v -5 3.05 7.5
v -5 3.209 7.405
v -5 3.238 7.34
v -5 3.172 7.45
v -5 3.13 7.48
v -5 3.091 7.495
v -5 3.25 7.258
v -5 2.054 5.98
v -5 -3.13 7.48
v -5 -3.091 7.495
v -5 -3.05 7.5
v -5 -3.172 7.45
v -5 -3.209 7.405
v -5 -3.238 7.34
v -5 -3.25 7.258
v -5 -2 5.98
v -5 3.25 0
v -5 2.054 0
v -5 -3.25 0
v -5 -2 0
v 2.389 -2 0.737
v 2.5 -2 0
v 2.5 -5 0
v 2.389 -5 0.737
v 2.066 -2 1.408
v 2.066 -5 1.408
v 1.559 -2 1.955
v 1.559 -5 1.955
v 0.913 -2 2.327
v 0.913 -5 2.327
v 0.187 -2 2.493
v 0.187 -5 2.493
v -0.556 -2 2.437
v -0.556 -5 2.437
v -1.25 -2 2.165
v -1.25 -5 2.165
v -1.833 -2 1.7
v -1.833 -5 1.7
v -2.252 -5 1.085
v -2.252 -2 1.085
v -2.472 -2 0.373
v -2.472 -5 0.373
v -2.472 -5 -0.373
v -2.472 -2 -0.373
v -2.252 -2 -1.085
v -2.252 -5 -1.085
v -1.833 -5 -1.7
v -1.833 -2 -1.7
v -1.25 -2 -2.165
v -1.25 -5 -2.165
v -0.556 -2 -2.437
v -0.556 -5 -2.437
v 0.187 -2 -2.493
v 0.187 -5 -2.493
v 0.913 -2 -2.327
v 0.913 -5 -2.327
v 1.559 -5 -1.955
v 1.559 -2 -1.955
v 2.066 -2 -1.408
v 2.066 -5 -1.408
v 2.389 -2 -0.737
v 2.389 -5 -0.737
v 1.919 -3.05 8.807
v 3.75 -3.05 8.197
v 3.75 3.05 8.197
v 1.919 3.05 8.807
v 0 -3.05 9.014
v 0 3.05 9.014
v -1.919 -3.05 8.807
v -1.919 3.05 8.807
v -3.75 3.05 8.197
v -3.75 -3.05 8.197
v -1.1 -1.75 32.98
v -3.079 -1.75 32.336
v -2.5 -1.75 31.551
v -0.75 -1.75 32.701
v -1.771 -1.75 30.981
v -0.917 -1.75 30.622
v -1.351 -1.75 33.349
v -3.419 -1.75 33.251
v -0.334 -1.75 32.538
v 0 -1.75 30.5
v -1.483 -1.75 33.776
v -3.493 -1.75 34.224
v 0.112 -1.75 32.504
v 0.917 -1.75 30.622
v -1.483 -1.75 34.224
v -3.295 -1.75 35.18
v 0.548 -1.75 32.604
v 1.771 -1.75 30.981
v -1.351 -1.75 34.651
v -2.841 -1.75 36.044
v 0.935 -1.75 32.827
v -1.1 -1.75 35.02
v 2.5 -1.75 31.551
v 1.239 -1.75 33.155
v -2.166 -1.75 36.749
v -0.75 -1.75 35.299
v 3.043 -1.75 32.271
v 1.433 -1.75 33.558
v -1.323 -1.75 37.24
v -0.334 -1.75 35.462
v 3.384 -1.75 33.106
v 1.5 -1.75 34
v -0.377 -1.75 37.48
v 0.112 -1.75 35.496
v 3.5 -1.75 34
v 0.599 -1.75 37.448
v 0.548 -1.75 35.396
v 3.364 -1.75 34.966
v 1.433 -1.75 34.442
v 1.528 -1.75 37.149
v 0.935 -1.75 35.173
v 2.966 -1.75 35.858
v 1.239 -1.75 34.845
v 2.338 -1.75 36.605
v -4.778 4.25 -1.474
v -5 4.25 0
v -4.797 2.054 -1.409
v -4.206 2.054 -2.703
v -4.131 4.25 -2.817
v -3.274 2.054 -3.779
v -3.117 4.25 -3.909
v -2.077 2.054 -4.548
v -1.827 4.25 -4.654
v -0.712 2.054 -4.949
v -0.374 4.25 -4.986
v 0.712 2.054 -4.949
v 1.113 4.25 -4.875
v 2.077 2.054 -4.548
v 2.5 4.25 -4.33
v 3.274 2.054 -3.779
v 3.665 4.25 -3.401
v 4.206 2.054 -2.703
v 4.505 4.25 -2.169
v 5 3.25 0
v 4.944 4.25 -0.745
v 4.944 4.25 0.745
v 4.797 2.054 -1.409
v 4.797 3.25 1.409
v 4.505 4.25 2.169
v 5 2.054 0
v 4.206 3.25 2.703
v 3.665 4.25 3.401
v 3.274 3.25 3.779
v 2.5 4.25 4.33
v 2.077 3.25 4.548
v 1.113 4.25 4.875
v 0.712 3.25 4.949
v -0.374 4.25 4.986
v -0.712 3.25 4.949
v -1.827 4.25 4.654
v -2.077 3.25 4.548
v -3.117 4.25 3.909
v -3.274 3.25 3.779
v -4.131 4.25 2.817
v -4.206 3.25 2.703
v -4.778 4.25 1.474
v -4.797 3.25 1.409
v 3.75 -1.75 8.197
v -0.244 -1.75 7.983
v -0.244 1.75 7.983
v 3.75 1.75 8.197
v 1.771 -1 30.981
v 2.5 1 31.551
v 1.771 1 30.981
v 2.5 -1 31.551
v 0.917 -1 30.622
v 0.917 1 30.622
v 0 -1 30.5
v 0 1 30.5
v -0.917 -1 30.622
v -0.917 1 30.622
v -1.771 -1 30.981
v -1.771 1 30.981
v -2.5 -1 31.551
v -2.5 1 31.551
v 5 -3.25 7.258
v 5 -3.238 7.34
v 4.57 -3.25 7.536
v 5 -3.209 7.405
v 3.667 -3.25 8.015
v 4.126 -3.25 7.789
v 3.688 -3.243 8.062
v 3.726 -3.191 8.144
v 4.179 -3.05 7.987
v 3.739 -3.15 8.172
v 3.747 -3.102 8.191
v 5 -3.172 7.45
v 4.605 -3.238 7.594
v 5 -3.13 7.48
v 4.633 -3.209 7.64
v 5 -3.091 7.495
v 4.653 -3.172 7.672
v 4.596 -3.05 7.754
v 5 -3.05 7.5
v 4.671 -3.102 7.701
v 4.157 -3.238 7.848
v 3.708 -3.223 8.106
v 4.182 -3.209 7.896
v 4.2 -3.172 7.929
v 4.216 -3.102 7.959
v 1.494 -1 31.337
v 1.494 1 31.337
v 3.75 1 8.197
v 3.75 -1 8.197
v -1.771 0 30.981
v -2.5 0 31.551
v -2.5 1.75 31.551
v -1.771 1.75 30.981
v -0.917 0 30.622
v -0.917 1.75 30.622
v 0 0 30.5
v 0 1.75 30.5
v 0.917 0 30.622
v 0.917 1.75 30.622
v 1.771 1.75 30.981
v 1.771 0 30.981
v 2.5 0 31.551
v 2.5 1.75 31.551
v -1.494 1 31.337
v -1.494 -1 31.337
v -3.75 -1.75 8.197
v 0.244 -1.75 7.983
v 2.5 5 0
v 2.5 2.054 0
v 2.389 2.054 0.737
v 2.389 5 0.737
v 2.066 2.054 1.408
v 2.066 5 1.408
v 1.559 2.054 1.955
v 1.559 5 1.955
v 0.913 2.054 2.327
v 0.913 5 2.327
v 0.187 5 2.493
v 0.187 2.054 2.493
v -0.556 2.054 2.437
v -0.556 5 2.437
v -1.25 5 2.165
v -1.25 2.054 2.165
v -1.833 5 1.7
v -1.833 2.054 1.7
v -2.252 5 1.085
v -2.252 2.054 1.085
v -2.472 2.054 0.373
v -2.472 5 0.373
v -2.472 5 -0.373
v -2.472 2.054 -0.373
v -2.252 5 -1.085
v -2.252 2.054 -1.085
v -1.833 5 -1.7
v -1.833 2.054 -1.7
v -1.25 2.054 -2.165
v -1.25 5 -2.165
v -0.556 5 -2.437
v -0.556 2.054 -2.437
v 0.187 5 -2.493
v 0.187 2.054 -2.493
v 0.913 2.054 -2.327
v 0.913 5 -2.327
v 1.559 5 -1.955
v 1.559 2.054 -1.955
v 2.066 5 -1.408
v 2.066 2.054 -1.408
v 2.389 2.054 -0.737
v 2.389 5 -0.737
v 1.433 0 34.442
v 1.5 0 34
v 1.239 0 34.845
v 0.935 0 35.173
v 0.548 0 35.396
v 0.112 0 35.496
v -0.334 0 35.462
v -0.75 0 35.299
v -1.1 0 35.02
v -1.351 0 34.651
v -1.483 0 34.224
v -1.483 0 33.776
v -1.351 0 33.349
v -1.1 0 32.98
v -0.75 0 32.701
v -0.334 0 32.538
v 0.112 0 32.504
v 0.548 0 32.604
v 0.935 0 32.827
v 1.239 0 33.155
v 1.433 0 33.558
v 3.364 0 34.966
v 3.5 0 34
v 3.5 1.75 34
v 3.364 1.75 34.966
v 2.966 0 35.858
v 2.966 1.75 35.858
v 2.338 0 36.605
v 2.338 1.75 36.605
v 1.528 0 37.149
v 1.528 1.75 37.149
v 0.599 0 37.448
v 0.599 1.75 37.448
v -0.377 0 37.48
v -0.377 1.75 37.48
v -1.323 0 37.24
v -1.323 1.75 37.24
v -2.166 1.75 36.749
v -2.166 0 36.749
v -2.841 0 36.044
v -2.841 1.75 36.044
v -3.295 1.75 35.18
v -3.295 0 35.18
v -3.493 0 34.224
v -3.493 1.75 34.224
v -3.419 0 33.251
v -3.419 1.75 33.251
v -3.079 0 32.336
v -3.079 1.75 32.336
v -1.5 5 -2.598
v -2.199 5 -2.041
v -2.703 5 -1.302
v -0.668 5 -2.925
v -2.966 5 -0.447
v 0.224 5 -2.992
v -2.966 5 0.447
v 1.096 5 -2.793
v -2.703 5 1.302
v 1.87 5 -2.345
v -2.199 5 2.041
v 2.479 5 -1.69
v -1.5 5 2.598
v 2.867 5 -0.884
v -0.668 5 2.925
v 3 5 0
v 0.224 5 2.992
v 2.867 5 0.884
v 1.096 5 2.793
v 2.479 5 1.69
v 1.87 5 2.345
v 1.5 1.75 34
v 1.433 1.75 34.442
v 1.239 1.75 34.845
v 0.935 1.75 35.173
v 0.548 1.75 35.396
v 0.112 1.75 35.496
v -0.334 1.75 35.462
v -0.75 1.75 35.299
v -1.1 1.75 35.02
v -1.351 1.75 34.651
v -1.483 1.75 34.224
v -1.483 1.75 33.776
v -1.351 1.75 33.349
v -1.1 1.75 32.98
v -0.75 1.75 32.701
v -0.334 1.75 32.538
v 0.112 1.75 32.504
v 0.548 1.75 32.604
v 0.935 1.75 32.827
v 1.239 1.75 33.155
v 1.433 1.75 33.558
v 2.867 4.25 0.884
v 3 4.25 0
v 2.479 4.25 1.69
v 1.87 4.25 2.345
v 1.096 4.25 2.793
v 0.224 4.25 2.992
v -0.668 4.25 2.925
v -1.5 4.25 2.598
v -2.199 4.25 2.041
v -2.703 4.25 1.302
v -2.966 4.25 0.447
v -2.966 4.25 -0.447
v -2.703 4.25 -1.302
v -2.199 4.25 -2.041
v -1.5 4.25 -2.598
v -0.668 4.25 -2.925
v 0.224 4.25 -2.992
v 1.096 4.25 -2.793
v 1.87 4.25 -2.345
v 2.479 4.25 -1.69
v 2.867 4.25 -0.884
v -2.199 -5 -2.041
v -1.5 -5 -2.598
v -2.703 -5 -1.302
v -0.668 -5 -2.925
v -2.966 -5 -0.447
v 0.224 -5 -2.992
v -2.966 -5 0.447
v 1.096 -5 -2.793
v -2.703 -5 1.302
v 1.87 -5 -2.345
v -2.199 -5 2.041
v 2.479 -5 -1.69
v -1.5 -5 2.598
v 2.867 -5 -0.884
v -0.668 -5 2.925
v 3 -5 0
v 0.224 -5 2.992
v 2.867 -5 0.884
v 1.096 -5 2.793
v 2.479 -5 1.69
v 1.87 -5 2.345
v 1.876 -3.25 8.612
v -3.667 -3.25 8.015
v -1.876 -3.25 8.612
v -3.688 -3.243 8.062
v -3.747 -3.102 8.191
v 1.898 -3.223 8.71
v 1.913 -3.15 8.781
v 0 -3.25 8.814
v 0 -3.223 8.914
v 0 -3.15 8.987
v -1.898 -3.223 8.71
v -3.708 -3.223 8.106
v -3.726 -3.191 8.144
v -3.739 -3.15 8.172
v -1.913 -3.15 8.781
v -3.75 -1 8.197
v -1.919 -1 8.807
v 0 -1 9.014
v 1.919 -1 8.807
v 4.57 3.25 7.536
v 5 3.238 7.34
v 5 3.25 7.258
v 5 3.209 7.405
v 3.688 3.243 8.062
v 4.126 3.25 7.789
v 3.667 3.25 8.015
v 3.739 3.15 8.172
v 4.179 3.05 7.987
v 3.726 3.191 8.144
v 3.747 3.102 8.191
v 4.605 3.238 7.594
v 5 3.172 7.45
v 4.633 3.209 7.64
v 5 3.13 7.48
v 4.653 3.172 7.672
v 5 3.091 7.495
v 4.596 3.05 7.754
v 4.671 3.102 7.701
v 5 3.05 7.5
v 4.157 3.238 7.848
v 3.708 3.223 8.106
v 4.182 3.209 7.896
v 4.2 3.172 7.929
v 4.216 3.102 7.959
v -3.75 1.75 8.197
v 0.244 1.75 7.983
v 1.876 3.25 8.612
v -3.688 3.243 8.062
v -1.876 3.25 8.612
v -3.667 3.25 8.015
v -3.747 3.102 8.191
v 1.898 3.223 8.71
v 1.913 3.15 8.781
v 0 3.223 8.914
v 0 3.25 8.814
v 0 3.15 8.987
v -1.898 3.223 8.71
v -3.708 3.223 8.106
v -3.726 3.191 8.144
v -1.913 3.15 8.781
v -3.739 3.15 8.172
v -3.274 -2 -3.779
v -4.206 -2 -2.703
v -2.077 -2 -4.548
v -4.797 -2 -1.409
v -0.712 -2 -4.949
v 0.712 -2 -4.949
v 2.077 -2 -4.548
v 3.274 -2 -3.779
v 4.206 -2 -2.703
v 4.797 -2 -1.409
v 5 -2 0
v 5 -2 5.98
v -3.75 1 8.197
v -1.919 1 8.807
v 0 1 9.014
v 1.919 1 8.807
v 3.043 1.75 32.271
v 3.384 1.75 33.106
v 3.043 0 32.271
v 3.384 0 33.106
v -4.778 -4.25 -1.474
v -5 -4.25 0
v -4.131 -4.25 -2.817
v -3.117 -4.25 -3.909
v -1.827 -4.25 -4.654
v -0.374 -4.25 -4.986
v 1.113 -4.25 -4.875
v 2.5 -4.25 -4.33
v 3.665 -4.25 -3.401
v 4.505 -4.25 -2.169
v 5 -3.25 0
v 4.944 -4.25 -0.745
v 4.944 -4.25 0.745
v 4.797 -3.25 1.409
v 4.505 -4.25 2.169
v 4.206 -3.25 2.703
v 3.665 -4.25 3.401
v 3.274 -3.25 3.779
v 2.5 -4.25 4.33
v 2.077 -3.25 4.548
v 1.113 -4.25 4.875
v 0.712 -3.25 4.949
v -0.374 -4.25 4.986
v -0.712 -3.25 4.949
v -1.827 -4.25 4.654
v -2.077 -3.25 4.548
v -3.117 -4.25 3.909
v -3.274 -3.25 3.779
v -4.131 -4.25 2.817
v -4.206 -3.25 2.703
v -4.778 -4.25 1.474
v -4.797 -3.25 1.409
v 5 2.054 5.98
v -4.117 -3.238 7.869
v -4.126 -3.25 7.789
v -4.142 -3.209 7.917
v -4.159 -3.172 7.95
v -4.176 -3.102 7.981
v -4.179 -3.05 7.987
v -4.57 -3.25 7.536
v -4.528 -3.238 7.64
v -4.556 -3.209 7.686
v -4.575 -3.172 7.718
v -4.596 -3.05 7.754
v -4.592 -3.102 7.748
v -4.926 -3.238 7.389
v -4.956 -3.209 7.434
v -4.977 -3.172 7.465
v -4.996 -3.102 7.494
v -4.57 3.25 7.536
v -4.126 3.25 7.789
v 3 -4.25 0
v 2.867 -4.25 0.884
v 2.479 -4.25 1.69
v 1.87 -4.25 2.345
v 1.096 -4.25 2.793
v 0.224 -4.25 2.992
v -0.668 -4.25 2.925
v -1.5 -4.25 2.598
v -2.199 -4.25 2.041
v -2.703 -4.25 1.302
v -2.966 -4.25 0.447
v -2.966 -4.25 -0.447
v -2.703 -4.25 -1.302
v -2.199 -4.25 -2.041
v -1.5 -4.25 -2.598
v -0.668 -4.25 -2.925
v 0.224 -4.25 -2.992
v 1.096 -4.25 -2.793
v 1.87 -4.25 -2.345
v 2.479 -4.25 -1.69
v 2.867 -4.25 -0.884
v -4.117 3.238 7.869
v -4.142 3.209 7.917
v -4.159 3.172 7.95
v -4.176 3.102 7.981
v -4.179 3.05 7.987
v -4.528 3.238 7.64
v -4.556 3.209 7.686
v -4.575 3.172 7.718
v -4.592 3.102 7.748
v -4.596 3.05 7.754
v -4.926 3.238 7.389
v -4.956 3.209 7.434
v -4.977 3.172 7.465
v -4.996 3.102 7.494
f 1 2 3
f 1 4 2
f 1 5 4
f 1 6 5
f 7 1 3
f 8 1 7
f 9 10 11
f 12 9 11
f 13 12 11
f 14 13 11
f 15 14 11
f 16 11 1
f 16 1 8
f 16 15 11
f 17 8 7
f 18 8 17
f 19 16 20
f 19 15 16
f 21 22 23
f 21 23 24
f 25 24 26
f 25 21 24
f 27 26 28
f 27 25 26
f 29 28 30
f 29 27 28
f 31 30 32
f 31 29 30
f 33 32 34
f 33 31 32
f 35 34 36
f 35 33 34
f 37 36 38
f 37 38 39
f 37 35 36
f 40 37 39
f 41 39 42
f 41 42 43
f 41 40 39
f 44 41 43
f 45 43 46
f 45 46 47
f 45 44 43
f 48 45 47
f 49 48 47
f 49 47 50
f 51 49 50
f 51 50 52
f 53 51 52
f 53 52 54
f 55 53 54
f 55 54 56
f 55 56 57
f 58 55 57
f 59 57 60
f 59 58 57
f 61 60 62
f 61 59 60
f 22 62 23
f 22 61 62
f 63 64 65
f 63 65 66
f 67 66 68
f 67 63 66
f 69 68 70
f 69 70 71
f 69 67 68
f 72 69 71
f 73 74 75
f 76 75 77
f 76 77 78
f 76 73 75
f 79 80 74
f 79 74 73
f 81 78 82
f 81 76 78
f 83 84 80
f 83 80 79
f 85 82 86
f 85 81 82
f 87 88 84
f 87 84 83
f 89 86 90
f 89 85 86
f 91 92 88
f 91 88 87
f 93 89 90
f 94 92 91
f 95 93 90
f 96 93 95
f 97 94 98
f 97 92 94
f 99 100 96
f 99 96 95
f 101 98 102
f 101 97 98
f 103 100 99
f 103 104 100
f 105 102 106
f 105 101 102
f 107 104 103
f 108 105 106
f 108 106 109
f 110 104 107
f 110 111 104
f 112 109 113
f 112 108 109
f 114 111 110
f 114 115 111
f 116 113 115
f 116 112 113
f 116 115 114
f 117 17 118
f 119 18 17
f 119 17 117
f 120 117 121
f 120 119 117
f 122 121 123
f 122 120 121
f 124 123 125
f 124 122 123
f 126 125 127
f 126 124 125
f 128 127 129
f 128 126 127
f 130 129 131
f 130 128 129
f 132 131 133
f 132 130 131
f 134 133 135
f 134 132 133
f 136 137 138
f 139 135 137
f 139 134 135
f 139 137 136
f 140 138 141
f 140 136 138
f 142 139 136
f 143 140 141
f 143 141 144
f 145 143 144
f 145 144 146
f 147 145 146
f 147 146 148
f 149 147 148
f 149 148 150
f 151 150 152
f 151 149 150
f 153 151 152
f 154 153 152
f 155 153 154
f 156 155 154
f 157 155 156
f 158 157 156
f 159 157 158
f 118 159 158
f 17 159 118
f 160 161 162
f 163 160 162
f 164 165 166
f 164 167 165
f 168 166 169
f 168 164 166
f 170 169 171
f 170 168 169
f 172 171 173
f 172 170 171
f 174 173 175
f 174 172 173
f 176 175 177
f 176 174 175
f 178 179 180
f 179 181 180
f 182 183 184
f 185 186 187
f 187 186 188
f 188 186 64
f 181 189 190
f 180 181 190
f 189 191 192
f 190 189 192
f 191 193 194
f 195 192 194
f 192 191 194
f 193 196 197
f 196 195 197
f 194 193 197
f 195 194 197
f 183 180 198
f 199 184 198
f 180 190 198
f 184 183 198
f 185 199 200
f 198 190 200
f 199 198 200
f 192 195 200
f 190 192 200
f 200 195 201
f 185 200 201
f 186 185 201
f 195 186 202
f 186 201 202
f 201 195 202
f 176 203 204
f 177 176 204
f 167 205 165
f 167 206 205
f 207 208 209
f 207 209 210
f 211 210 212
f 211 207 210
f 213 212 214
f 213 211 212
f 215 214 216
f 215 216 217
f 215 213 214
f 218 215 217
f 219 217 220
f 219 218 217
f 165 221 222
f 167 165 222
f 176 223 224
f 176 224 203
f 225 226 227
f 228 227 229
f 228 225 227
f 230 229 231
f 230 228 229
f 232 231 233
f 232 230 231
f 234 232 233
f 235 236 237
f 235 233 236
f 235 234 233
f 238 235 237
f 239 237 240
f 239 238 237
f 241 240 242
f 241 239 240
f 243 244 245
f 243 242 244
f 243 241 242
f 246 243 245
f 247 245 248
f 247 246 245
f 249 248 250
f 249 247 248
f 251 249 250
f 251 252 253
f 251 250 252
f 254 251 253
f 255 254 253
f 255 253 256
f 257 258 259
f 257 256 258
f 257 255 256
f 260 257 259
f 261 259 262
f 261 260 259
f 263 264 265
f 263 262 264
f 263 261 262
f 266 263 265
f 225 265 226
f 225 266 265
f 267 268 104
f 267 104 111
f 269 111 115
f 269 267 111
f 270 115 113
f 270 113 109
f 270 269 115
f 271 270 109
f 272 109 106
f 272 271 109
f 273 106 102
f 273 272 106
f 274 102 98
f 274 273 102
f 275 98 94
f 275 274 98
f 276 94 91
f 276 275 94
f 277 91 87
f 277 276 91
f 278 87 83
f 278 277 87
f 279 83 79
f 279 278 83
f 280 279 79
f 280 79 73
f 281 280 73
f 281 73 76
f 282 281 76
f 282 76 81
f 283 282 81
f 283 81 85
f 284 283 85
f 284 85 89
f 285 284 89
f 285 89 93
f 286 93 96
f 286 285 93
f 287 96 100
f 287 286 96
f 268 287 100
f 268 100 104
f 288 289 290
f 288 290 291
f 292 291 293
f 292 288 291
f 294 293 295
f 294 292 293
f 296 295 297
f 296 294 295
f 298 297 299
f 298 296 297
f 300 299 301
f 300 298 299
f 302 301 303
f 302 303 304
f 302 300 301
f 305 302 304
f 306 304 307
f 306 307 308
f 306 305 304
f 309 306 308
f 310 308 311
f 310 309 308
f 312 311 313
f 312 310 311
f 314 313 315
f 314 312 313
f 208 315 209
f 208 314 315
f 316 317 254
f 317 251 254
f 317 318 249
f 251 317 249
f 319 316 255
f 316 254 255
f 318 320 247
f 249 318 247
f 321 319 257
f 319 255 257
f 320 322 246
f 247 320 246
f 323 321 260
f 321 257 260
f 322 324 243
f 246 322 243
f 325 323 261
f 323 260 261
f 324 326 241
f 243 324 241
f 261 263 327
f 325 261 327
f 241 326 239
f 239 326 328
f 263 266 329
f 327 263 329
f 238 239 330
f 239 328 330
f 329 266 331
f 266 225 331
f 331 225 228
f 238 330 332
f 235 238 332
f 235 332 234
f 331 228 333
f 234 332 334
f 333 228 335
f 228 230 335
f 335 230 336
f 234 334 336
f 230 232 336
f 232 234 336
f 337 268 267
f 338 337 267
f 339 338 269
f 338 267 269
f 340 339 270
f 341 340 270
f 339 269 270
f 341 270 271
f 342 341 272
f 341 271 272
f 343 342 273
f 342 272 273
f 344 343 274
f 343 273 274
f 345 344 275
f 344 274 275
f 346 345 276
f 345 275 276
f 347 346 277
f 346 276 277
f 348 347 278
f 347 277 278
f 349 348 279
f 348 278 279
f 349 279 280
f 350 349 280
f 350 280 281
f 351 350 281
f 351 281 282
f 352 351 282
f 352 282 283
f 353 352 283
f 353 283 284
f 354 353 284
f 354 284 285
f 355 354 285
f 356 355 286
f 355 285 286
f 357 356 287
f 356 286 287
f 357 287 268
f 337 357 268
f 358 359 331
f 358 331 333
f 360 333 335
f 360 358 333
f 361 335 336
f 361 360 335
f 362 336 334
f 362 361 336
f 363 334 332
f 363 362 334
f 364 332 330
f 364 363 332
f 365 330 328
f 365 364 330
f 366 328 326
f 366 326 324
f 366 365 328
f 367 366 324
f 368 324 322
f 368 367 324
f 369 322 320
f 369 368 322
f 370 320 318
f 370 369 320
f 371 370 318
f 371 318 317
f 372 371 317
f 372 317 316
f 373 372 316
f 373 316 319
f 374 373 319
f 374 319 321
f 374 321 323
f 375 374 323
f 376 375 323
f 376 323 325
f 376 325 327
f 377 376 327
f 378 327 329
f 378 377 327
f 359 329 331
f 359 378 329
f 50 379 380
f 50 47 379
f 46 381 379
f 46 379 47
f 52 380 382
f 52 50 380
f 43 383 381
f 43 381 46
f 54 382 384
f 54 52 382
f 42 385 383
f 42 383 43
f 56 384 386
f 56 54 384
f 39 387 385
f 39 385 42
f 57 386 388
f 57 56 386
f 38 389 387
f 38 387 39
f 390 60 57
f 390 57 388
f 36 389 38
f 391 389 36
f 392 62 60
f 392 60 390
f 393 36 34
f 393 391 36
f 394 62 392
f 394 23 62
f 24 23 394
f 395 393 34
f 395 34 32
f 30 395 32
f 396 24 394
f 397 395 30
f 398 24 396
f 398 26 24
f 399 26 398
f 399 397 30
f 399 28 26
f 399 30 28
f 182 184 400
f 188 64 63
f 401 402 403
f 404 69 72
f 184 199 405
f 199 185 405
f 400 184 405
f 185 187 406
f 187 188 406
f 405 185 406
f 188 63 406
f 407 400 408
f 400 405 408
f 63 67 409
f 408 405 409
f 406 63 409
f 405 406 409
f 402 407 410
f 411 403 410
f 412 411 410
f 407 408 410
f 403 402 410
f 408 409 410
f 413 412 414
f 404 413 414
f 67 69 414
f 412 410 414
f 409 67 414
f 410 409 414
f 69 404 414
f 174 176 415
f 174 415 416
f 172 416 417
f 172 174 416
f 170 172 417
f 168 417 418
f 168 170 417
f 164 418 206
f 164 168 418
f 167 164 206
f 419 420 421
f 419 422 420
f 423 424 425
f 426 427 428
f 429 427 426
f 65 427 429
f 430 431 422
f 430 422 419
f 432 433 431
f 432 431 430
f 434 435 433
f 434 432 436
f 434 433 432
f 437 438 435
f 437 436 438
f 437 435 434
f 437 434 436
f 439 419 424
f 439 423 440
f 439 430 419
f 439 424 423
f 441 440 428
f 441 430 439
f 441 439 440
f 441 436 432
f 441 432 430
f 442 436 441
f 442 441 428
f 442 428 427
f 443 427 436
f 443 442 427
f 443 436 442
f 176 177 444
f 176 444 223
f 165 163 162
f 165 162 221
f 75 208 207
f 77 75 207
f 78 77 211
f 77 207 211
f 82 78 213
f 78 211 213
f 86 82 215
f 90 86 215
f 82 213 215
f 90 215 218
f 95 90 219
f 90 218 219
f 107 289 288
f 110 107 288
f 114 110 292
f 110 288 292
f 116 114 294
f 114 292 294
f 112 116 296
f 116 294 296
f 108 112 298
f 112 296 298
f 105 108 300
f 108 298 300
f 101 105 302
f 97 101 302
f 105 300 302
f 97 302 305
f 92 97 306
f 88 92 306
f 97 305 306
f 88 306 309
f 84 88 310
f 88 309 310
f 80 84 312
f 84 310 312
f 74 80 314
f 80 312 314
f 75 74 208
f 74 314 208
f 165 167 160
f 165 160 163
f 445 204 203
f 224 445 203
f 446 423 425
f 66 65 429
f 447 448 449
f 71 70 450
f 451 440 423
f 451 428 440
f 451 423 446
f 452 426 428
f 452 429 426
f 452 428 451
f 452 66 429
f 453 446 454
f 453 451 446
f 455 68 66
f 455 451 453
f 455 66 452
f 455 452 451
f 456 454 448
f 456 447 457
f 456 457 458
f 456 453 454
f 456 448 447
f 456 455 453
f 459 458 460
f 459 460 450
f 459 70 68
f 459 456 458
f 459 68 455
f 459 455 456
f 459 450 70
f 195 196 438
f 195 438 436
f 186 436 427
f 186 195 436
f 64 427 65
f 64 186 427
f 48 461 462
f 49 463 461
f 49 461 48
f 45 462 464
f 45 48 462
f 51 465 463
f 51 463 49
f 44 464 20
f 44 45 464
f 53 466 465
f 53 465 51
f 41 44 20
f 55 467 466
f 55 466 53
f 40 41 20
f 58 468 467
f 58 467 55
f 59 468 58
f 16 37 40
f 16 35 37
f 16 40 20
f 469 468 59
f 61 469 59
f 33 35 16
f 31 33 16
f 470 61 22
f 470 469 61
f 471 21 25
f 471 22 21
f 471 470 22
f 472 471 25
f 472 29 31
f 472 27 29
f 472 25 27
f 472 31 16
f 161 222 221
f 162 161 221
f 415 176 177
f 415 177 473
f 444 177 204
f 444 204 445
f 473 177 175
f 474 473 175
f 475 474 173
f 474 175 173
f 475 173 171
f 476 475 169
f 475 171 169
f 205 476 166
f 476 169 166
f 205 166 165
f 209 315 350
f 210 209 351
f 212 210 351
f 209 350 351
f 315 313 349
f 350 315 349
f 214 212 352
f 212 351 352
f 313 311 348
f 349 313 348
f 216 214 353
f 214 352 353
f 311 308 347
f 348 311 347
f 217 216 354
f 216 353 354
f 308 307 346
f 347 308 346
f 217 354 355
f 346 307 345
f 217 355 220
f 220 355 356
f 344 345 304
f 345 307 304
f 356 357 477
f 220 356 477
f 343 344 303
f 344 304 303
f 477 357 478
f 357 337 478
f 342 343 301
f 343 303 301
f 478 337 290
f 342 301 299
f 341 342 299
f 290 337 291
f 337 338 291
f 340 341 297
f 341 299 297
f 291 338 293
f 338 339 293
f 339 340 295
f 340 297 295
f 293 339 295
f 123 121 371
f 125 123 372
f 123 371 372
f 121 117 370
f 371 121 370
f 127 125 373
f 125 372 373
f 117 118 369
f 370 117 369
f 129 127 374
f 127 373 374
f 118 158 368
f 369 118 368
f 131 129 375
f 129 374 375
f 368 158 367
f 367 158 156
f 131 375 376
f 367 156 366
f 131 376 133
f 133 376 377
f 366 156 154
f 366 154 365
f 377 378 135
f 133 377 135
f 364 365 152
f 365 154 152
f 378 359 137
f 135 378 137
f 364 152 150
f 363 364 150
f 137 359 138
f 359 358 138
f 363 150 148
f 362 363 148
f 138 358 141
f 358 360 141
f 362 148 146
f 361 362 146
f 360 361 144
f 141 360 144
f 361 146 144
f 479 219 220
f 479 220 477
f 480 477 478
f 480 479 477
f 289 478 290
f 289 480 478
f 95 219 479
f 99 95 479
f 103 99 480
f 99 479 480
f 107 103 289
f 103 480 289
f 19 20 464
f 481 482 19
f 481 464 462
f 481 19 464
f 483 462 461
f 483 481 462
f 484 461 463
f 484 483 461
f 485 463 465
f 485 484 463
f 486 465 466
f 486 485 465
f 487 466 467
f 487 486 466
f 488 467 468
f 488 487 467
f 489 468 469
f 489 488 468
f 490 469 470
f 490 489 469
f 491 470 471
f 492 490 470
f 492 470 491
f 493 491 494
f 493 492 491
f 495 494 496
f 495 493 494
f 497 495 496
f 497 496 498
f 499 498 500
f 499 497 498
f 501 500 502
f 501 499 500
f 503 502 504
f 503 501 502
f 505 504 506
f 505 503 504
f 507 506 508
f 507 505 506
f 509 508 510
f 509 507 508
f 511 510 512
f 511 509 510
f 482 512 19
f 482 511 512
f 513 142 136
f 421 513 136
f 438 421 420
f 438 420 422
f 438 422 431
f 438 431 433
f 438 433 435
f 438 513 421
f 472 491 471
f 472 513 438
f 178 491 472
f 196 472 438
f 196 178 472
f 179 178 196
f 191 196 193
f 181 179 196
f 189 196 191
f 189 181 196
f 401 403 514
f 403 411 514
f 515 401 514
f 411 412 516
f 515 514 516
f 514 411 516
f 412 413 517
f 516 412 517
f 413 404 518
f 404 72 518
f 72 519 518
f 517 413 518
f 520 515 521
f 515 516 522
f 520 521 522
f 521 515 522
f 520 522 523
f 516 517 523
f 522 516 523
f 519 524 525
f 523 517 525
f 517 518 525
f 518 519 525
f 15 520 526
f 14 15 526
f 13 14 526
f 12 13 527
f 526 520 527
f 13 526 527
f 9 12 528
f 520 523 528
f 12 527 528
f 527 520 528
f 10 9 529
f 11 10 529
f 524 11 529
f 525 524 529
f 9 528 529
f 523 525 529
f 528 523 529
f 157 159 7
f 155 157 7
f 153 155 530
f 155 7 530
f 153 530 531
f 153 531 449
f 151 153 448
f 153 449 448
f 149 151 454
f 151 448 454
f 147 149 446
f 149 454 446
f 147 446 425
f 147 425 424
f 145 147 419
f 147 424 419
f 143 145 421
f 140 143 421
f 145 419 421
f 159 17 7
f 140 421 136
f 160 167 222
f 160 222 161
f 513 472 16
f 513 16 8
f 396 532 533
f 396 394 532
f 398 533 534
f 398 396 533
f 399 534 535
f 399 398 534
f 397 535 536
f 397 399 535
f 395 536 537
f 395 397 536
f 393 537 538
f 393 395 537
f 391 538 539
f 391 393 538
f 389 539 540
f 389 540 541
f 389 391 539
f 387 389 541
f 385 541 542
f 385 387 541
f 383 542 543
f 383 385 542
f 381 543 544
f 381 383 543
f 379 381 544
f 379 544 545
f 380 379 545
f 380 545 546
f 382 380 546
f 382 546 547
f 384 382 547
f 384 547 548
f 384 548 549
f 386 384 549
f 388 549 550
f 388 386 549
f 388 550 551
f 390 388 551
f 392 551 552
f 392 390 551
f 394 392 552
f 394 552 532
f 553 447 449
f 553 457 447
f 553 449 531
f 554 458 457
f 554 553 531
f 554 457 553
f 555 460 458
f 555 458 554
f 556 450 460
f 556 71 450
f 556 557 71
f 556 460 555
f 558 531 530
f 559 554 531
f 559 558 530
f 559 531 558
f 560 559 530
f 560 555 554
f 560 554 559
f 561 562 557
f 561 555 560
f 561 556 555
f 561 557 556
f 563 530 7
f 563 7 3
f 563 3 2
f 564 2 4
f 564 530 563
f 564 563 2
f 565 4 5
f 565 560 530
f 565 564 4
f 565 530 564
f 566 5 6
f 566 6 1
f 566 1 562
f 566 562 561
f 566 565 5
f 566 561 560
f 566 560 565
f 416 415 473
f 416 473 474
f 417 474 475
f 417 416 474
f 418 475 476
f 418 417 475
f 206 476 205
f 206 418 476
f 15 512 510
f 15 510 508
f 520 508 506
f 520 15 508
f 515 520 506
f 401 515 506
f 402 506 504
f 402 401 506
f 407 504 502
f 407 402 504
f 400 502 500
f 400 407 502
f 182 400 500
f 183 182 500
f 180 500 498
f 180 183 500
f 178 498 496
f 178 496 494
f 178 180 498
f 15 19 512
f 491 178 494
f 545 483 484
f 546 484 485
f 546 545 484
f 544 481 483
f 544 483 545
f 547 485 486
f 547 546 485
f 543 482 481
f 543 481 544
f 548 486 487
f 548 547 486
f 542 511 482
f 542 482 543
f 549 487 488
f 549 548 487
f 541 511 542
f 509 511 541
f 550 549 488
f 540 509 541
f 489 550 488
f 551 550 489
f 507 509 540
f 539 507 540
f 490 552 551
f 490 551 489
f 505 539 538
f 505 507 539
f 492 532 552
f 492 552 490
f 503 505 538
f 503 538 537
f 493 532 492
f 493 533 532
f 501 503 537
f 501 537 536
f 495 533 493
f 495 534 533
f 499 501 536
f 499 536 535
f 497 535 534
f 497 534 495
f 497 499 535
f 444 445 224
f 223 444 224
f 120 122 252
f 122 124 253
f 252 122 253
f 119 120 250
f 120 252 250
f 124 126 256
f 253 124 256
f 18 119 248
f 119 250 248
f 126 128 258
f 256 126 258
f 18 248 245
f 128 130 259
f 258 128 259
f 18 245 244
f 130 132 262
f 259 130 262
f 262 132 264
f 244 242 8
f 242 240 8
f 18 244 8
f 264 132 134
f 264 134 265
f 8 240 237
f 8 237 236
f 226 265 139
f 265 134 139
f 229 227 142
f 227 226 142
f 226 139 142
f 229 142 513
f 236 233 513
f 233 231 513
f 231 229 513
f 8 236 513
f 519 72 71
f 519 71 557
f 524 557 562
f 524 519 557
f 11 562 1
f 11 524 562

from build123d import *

# Parameters (mm, degrees)
F1_DEPTH  = 3.25
F0_R      = 3
F2_DEPTH  = 4.25
F0_R_2    = 2.5
F3_DEPTH  = 5
F6_W      = 4.0535052015
F6_H      = 12.9377121635
F7_DEPTH  = 10
F0_R_3    = 1.5
F8_DEPTH  = 1.75
F9_DEPTH  = 1
F12_DEPTH = 4
F15_DEPTH = 4
F16_R     = 0.2


with BuildPart() as f1:
    # F0 (on Front) → F1 (new body, symmetric)
    with BuildSketch(Plane.XZ):
        with BuildLine():
            ThreePointArc((3.75, 8.1967981554), (0, 9.0138781887), (-3.75, 8.1967981554))
            ThreePointArc((-3.75, 8.1967981554), (-4.3888502956, 7.8732453971), (-5, 7.5))
            Line((-5, 7.5), (-5, 0))
            ThreePointArc((-5, 0), (0, 5), (5, 0))
            Line((5, 0), (5, 7.5))
            ThreePointArc((5, 7.5), (4.3888502956, 7.8732453971), (3.75, 8.1967981554))
        make_face()
    extrude(amount=F1_DEPTH, both=True)

    # F0 (on Front) → F2 (join, symmetric)
    with BuildSketch(Plane.XZ):
        with BuildLine():
            ThreePointArc((5, 0), (0, 5), (-5, 0))
            ThreePointArc((-5, 0), (0, -5), (5, 0))
        make_face()
        Circle(F0_R, mode=Mode.SUBTRACT)
    extrude(amount=F2_DEPTH, both=True)

    # F0 (on Front) → F3 (join, symmetric)
    with BuildSketch(Plane.XZ):
        Circle(F0_R)
        Circle(F0_R_2, mode=Mode.SUBTRACT)
    extrude(amount=F3_DEPTH, both=True)

    # F6 (on offset) → F7 (cut)
    with BuildSketch(Plane.YZ.offset(5)):
        with Locations((0.0267526008, -0.4891203716)):
            Rectangle(F6_W, F6_H)
    extrude(amount=-F7_DEPTH, mode=Mode.SUBTRACT)

    # F16
    f16_edges = [f1.edges().sort_by_distance(p)[0] for p in [
        (0, -3.25, 9.013878),
        (0, 3.25, 9.013878),
    ]]
    fillet(f16_edges, radius=F16_R)


with BuildPart() as f8:
    # F0 (on Front) → F8 (new body, symmetric)
    with BuildSketch(Plane.XZ):
        with BuildLine():
            ThreePointArc((2.5, 31.5505102572), (3.2403703492, 32.6771243445), (3.5, 34))
            ThreePointArc((3.5, 34), (-1.3228756555, 37.2403703492), (-2.5, 31.5505102572))
            ThreePointArc((-2.5, 31.5505102572), (0, 30.5), (2.5, 31.5505102572))
        make_face()
        with Locations((0, 34)):
            Circle(F0_R_3, mode=Mode.SUBTRACT)
    extrude(amount=F8_DEPTH, both=True)


with BuildPart() as f9:
    # F0 (on Front) → F9 (new body, symmetric)
    with BuildSketch(Plane.XZ):
        with BuildLine():
            ThreePointArc((2.5, 31.5505102572), (0, 30.5), (-2.5, 31.5505102572))
            Line((-2.5, 31.5505102572), (-3.75, 8.1967981554))
            ThreePointArc((-3.75, 8.1967981554), (0, 9.0138781887), (3.75, 8.1967981554))
            Line((3.75, 8.1967981554), (2.5, 31.5505102572))
        make_face()
    extrude(amount=F9_DEPTH, both=True)


with BuildPart() as f12:
    # F11 (on offset) → F12 (new body)
    with BuildSketch(Plane(origin=(4.1767650311, 0, 0.2235600176), x_dir=(0, 1, 0), z_dir=(0.9985706248, 0, 0.0534481746))):
        Polygon((-1, 31.3717923027), (-1.75, 7.9846512005), (1.75, 7.9846512005), (1, 31.3717923027), align=None)
    extrude(amount=-F12_DEPTH)


with BuildPart() as f15:
    # F14 (on offset) → F15 (new body)
    with BuildSketch(Plane(origin=(-4.1767650311, 0, 0.2235600176), x_dir=(0, -1, 0), z_dir=(-0.9985706248, 0, 0.0534481746))):
        Polygon((-1, 31.3717923027), (-1.75, 7.9846512005), (1.75, 7.9846512005), (1, 31.3717923027), align=None)
    extrude(amount=-F15_DEPTH)


solid = Compound([f1.part, f8.part, f9.part, f12.part, f15.part])
